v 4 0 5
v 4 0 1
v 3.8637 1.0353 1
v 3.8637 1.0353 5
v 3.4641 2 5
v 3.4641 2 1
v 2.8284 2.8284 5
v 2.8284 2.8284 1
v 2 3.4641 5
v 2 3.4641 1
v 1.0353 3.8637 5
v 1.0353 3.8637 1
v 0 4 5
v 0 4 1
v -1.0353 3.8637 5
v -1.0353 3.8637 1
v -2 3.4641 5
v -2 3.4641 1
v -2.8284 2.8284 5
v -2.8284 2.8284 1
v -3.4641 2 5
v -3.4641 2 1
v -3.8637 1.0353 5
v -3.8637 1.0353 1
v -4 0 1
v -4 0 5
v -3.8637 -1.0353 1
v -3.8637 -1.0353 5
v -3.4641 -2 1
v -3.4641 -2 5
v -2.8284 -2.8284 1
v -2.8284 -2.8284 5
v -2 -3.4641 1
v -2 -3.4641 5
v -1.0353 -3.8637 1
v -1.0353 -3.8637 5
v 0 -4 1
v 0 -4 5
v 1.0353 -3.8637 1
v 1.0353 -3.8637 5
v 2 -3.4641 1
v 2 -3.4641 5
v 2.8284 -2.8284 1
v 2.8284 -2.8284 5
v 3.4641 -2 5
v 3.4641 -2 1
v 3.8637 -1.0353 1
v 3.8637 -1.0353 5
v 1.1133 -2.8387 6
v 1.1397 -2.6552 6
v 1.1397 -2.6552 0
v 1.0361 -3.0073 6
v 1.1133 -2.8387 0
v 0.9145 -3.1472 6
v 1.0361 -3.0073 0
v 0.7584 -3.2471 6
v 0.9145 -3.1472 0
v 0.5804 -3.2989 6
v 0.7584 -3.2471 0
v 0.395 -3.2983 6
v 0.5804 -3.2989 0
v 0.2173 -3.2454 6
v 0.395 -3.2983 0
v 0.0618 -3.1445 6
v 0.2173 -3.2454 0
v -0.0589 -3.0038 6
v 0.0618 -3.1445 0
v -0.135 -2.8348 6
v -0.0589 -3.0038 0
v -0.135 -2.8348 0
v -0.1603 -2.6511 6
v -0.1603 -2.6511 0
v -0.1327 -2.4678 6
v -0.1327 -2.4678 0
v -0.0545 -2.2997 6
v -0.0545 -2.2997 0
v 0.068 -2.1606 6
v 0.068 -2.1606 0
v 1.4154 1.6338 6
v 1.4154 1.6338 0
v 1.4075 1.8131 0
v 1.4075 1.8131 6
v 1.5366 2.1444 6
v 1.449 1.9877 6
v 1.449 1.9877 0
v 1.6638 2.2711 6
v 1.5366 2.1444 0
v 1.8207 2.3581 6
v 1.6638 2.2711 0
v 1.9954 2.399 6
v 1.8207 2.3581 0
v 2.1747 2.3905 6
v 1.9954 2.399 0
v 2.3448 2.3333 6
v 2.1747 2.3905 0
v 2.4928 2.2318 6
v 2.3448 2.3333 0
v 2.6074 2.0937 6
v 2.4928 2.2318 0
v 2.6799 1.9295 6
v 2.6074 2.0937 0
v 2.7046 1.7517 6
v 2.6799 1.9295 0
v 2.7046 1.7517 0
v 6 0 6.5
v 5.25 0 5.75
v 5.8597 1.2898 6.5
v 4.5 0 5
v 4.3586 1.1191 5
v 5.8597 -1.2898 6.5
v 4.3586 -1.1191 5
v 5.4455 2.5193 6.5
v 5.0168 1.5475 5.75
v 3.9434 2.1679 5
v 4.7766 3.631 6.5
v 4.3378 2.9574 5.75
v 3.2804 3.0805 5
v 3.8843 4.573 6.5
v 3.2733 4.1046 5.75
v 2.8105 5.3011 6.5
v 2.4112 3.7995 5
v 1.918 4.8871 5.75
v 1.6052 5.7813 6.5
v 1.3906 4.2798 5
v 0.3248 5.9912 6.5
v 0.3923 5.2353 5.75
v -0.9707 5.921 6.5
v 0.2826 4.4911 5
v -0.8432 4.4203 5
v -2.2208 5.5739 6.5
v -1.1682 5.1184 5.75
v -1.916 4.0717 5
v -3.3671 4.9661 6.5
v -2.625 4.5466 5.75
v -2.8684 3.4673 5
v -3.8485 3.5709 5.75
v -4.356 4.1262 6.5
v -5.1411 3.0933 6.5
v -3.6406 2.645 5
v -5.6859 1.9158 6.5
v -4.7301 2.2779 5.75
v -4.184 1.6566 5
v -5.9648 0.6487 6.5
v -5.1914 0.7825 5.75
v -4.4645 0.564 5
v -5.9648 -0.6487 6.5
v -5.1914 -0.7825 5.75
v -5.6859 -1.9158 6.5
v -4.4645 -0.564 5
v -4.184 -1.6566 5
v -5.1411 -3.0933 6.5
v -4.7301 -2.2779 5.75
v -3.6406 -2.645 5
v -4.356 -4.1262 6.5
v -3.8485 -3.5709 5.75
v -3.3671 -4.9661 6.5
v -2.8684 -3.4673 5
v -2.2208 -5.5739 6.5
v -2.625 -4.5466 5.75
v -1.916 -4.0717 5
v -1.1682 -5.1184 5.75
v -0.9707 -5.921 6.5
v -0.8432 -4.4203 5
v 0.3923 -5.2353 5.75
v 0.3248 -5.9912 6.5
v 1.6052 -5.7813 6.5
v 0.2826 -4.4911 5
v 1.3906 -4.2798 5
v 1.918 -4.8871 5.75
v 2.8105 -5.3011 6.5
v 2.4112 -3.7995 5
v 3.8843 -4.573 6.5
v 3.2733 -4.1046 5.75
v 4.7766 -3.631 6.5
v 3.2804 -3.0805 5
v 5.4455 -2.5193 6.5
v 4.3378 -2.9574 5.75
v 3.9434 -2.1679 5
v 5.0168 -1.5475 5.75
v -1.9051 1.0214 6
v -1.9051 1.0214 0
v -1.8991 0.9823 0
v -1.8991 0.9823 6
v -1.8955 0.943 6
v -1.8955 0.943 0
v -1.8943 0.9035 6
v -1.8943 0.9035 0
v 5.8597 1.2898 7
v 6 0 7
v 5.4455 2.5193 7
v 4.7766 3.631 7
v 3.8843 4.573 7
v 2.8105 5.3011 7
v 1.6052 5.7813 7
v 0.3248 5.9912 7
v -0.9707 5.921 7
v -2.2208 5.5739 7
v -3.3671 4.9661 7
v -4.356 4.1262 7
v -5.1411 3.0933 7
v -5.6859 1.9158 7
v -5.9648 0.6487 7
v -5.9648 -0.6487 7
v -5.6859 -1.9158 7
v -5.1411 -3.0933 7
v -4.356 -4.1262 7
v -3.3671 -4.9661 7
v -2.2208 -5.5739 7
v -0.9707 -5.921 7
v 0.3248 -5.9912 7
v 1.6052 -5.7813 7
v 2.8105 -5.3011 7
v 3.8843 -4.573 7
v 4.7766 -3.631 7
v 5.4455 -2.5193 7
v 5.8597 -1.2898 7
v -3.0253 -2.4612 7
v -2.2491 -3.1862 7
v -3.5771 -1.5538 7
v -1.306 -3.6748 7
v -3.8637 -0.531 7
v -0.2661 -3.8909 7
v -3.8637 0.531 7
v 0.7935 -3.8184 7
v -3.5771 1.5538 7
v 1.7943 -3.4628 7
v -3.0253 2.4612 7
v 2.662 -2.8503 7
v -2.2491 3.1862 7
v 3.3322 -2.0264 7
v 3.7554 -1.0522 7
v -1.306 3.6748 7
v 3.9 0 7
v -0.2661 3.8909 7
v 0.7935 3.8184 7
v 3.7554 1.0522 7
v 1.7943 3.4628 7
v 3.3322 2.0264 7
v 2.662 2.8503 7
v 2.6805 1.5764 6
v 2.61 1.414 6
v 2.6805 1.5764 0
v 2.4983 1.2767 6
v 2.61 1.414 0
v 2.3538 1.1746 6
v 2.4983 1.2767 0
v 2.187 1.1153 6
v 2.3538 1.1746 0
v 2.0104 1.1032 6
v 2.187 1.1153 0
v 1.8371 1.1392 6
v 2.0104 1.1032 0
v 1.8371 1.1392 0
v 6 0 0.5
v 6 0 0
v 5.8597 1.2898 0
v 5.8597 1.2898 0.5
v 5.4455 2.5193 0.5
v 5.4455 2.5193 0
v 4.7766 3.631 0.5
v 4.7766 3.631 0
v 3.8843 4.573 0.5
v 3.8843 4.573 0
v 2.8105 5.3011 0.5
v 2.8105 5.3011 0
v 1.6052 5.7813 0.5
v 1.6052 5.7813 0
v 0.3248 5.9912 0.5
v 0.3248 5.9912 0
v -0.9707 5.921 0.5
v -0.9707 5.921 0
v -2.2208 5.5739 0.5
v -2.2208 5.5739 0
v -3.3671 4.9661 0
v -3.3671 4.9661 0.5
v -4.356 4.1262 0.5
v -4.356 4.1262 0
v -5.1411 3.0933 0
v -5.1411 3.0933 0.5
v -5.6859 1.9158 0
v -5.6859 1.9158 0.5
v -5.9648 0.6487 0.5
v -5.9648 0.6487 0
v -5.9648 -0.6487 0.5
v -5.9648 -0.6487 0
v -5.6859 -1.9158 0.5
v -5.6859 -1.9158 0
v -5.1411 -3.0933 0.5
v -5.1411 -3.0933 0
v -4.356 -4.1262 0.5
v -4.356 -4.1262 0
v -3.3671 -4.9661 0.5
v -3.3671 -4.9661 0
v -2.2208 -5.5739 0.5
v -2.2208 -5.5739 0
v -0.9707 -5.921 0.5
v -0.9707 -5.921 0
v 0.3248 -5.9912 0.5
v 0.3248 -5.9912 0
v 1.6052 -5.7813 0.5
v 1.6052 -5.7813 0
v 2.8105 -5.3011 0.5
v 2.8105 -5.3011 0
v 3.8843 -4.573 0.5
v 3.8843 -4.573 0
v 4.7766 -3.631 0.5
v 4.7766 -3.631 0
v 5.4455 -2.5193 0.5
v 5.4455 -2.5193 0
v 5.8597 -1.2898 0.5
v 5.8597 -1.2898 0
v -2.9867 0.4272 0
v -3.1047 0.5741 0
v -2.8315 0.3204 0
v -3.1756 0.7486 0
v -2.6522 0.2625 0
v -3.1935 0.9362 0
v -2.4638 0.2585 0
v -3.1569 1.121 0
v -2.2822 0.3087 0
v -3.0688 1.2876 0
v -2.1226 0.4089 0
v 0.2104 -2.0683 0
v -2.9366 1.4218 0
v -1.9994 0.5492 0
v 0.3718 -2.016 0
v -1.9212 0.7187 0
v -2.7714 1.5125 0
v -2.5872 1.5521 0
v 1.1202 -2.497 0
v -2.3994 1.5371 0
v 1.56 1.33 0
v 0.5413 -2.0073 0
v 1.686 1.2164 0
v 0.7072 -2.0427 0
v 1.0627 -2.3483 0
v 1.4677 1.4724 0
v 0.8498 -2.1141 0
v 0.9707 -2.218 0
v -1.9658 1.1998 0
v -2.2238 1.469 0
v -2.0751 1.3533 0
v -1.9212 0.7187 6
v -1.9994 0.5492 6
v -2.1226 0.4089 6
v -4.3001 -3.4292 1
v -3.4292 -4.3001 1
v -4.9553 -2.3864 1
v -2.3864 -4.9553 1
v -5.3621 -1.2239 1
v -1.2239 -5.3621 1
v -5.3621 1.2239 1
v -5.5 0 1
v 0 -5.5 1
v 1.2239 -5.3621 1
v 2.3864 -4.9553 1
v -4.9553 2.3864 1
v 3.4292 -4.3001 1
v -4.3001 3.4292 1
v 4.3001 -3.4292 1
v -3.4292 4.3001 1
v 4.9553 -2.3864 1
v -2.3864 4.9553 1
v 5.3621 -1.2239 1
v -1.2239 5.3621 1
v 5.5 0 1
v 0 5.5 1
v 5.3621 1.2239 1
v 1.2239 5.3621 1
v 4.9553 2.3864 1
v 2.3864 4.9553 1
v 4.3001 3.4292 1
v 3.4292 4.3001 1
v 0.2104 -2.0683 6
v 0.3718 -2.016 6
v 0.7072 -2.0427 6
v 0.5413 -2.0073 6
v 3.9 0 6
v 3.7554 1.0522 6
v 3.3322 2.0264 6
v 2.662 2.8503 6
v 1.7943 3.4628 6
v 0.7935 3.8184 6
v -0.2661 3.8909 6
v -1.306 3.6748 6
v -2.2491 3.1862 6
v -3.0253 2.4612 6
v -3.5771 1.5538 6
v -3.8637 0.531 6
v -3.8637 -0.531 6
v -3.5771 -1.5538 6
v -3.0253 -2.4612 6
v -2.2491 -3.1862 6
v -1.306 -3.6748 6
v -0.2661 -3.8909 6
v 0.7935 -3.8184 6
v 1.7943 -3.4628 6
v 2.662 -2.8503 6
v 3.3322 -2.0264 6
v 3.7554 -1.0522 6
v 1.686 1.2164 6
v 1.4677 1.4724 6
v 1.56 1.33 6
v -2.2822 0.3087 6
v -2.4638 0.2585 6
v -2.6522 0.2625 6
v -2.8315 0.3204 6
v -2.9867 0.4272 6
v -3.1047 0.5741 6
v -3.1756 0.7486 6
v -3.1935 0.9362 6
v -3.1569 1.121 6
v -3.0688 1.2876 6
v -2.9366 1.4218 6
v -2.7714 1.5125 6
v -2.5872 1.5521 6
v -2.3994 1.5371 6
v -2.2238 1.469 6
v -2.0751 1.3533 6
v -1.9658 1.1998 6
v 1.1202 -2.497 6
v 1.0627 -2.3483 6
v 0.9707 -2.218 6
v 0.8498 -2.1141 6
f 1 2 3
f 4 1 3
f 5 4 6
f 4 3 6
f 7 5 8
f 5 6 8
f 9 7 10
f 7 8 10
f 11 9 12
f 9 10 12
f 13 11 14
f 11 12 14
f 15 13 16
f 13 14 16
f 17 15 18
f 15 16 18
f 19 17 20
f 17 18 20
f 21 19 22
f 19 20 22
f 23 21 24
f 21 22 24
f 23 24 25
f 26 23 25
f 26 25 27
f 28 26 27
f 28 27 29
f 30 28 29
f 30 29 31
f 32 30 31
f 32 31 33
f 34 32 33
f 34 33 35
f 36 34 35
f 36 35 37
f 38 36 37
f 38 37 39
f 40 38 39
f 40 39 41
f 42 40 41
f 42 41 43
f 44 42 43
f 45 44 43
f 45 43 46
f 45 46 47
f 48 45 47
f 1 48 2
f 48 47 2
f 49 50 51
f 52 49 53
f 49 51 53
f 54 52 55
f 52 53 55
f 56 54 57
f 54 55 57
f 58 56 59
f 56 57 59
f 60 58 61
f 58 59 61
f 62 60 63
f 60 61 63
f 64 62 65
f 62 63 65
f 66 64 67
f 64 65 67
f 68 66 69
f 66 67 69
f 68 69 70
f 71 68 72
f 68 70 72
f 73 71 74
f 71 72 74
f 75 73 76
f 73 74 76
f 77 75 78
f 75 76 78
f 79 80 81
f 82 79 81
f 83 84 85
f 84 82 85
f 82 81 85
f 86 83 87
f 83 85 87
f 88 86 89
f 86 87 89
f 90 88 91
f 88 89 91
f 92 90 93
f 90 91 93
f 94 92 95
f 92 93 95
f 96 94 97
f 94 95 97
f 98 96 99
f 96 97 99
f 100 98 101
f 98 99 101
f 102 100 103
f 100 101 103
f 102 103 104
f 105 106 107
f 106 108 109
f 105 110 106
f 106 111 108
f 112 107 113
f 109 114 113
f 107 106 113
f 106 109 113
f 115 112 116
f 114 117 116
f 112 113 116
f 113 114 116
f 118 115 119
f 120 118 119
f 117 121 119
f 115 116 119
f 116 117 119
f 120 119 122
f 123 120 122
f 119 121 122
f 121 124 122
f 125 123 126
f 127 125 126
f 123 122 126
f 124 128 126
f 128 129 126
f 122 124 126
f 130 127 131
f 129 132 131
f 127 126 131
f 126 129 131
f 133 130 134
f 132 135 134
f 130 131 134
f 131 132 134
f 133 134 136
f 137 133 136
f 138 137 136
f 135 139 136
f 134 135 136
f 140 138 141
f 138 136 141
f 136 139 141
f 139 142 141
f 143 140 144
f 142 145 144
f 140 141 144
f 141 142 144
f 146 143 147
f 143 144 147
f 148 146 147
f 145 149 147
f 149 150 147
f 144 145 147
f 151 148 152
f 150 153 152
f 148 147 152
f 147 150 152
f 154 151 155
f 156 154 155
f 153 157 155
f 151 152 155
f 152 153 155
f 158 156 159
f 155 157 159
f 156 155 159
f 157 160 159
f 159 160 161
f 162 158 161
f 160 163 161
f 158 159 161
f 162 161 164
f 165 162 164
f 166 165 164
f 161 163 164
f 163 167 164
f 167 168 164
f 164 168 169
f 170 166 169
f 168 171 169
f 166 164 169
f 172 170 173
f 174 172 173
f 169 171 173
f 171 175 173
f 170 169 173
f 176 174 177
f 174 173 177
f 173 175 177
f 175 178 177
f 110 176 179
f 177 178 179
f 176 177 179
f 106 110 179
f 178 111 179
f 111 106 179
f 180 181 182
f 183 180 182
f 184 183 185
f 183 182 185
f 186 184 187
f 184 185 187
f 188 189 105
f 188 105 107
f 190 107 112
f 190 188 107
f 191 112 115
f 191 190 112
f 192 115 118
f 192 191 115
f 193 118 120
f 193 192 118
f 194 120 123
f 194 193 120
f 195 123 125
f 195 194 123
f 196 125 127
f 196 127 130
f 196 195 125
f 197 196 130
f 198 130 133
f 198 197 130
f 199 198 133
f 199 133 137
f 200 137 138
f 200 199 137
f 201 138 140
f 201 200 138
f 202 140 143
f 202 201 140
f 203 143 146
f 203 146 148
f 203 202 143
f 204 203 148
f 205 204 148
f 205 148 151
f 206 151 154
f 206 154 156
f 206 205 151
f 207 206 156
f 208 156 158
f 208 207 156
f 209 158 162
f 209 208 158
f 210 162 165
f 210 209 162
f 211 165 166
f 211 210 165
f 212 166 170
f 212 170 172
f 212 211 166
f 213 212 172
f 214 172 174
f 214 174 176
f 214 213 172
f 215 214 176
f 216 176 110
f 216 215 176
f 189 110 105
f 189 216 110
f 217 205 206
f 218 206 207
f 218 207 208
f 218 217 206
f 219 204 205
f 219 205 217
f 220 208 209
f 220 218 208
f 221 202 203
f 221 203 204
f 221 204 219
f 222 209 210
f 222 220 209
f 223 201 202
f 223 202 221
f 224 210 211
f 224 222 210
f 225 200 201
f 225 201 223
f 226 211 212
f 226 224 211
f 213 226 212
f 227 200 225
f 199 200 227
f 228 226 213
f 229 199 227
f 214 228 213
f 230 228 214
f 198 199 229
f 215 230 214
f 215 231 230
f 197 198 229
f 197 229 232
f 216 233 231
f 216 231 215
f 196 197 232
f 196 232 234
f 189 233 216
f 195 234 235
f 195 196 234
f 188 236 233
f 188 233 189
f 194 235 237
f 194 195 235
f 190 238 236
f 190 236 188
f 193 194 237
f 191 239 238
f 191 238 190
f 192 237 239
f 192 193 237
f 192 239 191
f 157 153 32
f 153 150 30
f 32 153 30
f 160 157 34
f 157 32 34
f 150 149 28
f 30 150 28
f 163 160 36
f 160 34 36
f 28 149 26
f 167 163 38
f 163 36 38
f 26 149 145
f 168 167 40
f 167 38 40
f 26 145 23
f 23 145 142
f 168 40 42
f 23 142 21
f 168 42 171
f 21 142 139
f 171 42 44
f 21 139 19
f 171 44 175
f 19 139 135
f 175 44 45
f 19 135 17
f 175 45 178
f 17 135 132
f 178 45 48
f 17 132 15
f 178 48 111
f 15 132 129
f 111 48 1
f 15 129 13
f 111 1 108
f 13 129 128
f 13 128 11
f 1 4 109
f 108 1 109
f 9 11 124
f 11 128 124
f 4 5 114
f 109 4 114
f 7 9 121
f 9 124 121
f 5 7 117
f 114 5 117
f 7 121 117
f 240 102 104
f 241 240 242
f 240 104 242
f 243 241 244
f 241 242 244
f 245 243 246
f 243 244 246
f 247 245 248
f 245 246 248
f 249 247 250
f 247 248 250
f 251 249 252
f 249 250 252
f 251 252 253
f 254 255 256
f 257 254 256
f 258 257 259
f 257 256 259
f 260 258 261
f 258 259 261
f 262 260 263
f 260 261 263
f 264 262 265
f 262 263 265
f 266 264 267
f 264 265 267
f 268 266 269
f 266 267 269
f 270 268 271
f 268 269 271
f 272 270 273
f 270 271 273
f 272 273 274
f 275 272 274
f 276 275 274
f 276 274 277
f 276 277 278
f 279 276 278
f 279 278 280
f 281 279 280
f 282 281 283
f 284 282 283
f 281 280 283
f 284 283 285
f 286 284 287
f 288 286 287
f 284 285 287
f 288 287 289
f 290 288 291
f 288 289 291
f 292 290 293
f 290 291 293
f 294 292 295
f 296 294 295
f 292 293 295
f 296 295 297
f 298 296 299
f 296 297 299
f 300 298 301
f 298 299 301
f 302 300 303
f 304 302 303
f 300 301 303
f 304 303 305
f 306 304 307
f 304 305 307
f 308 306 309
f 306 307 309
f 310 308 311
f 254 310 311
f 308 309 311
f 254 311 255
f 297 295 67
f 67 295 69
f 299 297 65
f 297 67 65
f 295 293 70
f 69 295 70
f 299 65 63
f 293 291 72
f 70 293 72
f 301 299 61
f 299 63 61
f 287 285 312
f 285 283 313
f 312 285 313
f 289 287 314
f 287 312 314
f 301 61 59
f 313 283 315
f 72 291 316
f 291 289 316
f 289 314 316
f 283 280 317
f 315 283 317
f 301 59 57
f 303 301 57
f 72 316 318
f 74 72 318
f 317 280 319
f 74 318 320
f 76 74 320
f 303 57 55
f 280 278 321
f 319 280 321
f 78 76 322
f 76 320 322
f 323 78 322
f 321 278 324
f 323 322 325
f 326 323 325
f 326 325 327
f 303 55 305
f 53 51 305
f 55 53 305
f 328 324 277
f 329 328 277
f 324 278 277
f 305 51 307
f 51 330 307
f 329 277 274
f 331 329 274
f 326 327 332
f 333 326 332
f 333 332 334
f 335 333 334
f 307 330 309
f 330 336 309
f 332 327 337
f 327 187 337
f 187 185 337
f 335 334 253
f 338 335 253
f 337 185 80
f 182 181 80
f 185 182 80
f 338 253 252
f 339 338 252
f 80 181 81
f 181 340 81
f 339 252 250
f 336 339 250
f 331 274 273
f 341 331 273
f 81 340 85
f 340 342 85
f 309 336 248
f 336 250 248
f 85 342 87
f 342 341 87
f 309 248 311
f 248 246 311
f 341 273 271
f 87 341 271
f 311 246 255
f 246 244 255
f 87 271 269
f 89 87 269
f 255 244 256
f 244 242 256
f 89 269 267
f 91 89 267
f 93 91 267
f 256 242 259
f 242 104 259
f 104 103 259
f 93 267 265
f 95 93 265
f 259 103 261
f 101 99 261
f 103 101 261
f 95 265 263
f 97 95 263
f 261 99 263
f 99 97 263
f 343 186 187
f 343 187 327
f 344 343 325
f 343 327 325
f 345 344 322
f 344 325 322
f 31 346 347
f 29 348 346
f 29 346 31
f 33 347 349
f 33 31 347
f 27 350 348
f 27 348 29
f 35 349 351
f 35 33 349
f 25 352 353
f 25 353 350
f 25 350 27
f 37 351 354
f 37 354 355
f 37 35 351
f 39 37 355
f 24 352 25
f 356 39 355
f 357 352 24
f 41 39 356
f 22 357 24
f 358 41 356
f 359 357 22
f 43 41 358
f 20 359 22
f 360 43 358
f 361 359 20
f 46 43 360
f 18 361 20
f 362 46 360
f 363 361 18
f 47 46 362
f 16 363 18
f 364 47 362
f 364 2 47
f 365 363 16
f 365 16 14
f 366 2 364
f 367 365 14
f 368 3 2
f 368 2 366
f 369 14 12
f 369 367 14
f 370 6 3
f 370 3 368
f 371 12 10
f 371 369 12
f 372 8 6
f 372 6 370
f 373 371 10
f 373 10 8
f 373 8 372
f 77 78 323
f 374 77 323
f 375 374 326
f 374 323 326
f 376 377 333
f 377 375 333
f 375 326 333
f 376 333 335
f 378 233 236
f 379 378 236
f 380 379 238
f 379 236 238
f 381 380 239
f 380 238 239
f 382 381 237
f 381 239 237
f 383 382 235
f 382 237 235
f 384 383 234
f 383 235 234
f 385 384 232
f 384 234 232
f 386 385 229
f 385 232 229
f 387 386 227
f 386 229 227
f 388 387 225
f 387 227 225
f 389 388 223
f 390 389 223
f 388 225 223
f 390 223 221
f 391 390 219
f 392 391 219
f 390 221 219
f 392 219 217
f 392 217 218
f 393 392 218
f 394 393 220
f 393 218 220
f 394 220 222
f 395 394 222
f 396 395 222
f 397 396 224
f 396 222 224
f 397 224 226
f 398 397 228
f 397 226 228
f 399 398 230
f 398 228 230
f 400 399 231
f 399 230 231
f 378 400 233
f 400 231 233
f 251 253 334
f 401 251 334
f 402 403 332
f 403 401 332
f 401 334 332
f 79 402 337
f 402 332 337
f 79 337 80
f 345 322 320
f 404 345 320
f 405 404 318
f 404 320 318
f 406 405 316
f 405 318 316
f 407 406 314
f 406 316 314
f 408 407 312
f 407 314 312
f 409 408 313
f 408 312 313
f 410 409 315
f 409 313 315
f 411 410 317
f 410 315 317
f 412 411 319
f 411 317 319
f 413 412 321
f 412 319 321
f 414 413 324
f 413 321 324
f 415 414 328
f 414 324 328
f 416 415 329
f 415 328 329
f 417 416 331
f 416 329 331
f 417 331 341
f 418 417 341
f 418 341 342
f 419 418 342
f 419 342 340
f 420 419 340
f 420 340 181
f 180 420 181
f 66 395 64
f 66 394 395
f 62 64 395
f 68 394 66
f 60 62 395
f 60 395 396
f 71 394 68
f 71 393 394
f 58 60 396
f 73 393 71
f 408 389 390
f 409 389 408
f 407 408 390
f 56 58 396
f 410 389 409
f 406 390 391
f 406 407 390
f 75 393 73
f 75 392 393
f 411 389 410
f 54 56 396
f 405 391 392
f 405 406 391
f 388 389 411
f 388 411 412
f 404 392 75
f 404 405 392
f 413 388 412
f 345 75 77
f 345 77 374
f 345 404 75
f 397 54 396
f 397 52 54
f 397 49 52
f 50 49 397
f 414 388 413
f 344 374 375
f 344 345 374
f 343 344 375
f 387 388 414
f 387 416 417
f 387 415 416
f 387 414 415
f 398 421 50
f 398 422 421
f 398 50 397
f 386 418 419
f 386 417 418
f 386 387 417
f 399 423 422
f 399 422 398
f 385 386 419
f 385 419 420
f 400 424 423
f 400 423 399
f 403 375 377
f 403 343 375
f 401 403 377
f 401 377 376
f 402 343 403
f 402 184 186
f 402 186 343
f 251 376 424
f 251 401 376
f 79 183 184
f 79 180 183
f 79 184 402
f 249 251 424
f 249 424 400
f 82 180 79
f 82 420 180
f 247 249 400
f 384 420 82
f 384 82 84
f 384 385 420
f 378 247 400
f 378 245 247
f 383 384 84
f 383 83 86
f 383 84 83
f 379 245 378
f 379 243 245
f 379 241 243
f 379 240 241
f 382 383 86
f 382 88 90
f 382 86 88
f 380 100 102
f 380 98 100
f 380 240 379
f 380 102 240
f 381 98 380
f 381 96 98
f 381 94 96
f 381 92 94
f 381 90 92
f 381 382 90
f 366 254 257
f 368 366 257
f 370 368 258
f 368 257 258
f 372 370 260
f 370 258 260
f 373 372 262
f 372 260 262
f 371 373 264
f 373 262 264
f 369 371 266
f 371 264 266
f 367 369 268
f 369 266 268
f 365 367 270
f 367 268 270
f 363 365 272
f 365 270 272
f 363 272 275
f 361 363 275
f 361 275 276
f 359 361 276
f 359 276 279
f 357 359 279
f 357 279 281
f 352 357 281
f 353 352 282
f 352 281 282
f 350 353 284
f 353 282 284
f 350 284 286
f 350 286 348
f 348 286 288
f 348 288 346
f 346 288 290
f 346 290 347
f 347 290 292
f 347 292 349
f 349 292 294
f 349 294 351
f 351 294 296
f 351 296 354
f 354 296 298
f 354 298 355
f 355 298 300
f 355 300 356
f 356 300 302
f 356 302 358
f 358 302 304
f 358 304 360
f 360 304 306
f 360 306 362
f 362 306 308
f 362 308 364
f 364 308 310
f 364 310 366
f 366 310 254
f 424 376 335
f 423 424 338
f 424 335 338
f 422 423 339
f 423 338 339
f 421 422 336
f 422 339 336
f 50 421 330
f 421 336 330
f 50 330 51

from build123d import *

# Parameters (mm, degrees)
F0_R     = 6
F0_R_2   = 4
F1_DEPTH = 1
F2_DEPTH = 7
F3_R     = 6
F3_R_2   = 4
F4_DEPTH = 2
F3_R_3   = 3.9
F3_R_4   = 0.65
F5_DEPTH = 1
F6_SIZE  = 1.5
F7_SIZE  = 0.5


with BuildPart() as f1:
    # F0 (on Top) → F1 (new body)
    with BuildSketch(Plane.XY):
        Circle(F0_R)
        Circle(F0_R_2, mode=Mode.SUBTRACT)
    extrude(amount=F1_DEPTH)

    # F0 (on Top) → F2 (join)
    with BuildSketch(Plane.XY):
        Circle(F0_R_2)
        with BuildLine():
            ThreePointArc((1.1397100223, -2.6552182762), (0.217322658, -3.2453920843), (0.0680019491, -2.1605847745))
            Line((0.0680019491, -2.1605847745), (-2.1226334177, 0.4088743166))
            ThreePointArc((-2.1226334177, 0.4088743166), (-3.1568681461, 1.1210189597), (-1.9051222763, 1.0214009718))
            Line((-1.9051222763, 1.0214009718), (1.415412254, 1.6338173044))
            ThreePointArc((1.415412254, 1.6338173044), (1.9954389417, 2.3990096505), (2.7046314686, 1.7517104579))
            ThreePointArc((2.7046314686, 1.7517104579), (2.4295432969, 1.2207291767), (1.8371203272, 1.1391838027))
            Line((1.8371203272, 1.1391838027), (0.7072211637, -2.0426916209))
            ThreePointArc((0.7072211637, -2.0426916209), (1.0206913035, -2.2803064478), (1.1397100223, -2.6552182762))
        make_face(mode=Mode.SUBTRACT)
        with BuildLine():
            Line((-2.1226334177, 0.4088743166), (0.0680019491, -2.1605847745))
            ThreePointArc((0.0680019491, -2.1605847745), (0.3718168688, -2.0159990615), (0.7072211637, -2.0426916209))
            Line((0.7072211637, -2.0426916209), (1.8371203272, 1.1391838027))
            ThreePointArc((1.8371203272, 1.1391838027), (1.5599979669, 1.3300023847), (1.415412254, 1.6338173044))
            Line((1.415412254, 1.6338173044), (-1.9051222763, 1.0214009718))
            ThreePointArc((-1.9051222763, 1.0214009718), (-1.8970422983, 0.9627003452), (-1.8943414909, 0.9035078183))
            ThreePointArc((-1.8943414909, 0.9035078183), (-1.9541676828, 0.631120454), (-2.1226334177, 0.4088743166))
        make_face()
    extrude(amount=F2_DEPTH)

    # F3 (on face) → F4 (join)
    with BuildSketch(Plane.XY.offset(7)):
        Circle(F3_R)
        Circle(F3_R_2, mode=Mode.SUBTRACT)
    extrude(amount=-F4_DEPTH)

    # F3 (on face) → F5 (cut)
    with BuildSketch(Plane.XY.offset(7)):
        Circle(F3_R_3)
        with Locations((0.4897100223, -2.6552182762)):
            Circle(F3_R_4, mode=Mode.SUBTRACT)
        with Locations((-2.5443414909, 0.9035078183)):
            Circle(F3_R_4, mode=Mode.SUBTRACT)
        with Locations((2.0546314686, 1.7517104579)):
            Circle(F3_R_4, mode=Mode.SUBTRACT)
    extrude(amount=-F5_DEPTH, mode=Mode.SUBTRACT)

    # F6
    f6_edges = [f1.edges().sort_by_distance(p)[0] for p in [
        (-6, 0, 5),
    ]]
    chamfer(f6_edges, length=F6_SIZE)

    # F7
    f7_edges = [f1.edges().sort_by_distance(p)[0] for p in [
        (-6, 0, 1),
    ]]
    chamfer(f7_edges, length=F7_SIZE)


solid = f1.part
